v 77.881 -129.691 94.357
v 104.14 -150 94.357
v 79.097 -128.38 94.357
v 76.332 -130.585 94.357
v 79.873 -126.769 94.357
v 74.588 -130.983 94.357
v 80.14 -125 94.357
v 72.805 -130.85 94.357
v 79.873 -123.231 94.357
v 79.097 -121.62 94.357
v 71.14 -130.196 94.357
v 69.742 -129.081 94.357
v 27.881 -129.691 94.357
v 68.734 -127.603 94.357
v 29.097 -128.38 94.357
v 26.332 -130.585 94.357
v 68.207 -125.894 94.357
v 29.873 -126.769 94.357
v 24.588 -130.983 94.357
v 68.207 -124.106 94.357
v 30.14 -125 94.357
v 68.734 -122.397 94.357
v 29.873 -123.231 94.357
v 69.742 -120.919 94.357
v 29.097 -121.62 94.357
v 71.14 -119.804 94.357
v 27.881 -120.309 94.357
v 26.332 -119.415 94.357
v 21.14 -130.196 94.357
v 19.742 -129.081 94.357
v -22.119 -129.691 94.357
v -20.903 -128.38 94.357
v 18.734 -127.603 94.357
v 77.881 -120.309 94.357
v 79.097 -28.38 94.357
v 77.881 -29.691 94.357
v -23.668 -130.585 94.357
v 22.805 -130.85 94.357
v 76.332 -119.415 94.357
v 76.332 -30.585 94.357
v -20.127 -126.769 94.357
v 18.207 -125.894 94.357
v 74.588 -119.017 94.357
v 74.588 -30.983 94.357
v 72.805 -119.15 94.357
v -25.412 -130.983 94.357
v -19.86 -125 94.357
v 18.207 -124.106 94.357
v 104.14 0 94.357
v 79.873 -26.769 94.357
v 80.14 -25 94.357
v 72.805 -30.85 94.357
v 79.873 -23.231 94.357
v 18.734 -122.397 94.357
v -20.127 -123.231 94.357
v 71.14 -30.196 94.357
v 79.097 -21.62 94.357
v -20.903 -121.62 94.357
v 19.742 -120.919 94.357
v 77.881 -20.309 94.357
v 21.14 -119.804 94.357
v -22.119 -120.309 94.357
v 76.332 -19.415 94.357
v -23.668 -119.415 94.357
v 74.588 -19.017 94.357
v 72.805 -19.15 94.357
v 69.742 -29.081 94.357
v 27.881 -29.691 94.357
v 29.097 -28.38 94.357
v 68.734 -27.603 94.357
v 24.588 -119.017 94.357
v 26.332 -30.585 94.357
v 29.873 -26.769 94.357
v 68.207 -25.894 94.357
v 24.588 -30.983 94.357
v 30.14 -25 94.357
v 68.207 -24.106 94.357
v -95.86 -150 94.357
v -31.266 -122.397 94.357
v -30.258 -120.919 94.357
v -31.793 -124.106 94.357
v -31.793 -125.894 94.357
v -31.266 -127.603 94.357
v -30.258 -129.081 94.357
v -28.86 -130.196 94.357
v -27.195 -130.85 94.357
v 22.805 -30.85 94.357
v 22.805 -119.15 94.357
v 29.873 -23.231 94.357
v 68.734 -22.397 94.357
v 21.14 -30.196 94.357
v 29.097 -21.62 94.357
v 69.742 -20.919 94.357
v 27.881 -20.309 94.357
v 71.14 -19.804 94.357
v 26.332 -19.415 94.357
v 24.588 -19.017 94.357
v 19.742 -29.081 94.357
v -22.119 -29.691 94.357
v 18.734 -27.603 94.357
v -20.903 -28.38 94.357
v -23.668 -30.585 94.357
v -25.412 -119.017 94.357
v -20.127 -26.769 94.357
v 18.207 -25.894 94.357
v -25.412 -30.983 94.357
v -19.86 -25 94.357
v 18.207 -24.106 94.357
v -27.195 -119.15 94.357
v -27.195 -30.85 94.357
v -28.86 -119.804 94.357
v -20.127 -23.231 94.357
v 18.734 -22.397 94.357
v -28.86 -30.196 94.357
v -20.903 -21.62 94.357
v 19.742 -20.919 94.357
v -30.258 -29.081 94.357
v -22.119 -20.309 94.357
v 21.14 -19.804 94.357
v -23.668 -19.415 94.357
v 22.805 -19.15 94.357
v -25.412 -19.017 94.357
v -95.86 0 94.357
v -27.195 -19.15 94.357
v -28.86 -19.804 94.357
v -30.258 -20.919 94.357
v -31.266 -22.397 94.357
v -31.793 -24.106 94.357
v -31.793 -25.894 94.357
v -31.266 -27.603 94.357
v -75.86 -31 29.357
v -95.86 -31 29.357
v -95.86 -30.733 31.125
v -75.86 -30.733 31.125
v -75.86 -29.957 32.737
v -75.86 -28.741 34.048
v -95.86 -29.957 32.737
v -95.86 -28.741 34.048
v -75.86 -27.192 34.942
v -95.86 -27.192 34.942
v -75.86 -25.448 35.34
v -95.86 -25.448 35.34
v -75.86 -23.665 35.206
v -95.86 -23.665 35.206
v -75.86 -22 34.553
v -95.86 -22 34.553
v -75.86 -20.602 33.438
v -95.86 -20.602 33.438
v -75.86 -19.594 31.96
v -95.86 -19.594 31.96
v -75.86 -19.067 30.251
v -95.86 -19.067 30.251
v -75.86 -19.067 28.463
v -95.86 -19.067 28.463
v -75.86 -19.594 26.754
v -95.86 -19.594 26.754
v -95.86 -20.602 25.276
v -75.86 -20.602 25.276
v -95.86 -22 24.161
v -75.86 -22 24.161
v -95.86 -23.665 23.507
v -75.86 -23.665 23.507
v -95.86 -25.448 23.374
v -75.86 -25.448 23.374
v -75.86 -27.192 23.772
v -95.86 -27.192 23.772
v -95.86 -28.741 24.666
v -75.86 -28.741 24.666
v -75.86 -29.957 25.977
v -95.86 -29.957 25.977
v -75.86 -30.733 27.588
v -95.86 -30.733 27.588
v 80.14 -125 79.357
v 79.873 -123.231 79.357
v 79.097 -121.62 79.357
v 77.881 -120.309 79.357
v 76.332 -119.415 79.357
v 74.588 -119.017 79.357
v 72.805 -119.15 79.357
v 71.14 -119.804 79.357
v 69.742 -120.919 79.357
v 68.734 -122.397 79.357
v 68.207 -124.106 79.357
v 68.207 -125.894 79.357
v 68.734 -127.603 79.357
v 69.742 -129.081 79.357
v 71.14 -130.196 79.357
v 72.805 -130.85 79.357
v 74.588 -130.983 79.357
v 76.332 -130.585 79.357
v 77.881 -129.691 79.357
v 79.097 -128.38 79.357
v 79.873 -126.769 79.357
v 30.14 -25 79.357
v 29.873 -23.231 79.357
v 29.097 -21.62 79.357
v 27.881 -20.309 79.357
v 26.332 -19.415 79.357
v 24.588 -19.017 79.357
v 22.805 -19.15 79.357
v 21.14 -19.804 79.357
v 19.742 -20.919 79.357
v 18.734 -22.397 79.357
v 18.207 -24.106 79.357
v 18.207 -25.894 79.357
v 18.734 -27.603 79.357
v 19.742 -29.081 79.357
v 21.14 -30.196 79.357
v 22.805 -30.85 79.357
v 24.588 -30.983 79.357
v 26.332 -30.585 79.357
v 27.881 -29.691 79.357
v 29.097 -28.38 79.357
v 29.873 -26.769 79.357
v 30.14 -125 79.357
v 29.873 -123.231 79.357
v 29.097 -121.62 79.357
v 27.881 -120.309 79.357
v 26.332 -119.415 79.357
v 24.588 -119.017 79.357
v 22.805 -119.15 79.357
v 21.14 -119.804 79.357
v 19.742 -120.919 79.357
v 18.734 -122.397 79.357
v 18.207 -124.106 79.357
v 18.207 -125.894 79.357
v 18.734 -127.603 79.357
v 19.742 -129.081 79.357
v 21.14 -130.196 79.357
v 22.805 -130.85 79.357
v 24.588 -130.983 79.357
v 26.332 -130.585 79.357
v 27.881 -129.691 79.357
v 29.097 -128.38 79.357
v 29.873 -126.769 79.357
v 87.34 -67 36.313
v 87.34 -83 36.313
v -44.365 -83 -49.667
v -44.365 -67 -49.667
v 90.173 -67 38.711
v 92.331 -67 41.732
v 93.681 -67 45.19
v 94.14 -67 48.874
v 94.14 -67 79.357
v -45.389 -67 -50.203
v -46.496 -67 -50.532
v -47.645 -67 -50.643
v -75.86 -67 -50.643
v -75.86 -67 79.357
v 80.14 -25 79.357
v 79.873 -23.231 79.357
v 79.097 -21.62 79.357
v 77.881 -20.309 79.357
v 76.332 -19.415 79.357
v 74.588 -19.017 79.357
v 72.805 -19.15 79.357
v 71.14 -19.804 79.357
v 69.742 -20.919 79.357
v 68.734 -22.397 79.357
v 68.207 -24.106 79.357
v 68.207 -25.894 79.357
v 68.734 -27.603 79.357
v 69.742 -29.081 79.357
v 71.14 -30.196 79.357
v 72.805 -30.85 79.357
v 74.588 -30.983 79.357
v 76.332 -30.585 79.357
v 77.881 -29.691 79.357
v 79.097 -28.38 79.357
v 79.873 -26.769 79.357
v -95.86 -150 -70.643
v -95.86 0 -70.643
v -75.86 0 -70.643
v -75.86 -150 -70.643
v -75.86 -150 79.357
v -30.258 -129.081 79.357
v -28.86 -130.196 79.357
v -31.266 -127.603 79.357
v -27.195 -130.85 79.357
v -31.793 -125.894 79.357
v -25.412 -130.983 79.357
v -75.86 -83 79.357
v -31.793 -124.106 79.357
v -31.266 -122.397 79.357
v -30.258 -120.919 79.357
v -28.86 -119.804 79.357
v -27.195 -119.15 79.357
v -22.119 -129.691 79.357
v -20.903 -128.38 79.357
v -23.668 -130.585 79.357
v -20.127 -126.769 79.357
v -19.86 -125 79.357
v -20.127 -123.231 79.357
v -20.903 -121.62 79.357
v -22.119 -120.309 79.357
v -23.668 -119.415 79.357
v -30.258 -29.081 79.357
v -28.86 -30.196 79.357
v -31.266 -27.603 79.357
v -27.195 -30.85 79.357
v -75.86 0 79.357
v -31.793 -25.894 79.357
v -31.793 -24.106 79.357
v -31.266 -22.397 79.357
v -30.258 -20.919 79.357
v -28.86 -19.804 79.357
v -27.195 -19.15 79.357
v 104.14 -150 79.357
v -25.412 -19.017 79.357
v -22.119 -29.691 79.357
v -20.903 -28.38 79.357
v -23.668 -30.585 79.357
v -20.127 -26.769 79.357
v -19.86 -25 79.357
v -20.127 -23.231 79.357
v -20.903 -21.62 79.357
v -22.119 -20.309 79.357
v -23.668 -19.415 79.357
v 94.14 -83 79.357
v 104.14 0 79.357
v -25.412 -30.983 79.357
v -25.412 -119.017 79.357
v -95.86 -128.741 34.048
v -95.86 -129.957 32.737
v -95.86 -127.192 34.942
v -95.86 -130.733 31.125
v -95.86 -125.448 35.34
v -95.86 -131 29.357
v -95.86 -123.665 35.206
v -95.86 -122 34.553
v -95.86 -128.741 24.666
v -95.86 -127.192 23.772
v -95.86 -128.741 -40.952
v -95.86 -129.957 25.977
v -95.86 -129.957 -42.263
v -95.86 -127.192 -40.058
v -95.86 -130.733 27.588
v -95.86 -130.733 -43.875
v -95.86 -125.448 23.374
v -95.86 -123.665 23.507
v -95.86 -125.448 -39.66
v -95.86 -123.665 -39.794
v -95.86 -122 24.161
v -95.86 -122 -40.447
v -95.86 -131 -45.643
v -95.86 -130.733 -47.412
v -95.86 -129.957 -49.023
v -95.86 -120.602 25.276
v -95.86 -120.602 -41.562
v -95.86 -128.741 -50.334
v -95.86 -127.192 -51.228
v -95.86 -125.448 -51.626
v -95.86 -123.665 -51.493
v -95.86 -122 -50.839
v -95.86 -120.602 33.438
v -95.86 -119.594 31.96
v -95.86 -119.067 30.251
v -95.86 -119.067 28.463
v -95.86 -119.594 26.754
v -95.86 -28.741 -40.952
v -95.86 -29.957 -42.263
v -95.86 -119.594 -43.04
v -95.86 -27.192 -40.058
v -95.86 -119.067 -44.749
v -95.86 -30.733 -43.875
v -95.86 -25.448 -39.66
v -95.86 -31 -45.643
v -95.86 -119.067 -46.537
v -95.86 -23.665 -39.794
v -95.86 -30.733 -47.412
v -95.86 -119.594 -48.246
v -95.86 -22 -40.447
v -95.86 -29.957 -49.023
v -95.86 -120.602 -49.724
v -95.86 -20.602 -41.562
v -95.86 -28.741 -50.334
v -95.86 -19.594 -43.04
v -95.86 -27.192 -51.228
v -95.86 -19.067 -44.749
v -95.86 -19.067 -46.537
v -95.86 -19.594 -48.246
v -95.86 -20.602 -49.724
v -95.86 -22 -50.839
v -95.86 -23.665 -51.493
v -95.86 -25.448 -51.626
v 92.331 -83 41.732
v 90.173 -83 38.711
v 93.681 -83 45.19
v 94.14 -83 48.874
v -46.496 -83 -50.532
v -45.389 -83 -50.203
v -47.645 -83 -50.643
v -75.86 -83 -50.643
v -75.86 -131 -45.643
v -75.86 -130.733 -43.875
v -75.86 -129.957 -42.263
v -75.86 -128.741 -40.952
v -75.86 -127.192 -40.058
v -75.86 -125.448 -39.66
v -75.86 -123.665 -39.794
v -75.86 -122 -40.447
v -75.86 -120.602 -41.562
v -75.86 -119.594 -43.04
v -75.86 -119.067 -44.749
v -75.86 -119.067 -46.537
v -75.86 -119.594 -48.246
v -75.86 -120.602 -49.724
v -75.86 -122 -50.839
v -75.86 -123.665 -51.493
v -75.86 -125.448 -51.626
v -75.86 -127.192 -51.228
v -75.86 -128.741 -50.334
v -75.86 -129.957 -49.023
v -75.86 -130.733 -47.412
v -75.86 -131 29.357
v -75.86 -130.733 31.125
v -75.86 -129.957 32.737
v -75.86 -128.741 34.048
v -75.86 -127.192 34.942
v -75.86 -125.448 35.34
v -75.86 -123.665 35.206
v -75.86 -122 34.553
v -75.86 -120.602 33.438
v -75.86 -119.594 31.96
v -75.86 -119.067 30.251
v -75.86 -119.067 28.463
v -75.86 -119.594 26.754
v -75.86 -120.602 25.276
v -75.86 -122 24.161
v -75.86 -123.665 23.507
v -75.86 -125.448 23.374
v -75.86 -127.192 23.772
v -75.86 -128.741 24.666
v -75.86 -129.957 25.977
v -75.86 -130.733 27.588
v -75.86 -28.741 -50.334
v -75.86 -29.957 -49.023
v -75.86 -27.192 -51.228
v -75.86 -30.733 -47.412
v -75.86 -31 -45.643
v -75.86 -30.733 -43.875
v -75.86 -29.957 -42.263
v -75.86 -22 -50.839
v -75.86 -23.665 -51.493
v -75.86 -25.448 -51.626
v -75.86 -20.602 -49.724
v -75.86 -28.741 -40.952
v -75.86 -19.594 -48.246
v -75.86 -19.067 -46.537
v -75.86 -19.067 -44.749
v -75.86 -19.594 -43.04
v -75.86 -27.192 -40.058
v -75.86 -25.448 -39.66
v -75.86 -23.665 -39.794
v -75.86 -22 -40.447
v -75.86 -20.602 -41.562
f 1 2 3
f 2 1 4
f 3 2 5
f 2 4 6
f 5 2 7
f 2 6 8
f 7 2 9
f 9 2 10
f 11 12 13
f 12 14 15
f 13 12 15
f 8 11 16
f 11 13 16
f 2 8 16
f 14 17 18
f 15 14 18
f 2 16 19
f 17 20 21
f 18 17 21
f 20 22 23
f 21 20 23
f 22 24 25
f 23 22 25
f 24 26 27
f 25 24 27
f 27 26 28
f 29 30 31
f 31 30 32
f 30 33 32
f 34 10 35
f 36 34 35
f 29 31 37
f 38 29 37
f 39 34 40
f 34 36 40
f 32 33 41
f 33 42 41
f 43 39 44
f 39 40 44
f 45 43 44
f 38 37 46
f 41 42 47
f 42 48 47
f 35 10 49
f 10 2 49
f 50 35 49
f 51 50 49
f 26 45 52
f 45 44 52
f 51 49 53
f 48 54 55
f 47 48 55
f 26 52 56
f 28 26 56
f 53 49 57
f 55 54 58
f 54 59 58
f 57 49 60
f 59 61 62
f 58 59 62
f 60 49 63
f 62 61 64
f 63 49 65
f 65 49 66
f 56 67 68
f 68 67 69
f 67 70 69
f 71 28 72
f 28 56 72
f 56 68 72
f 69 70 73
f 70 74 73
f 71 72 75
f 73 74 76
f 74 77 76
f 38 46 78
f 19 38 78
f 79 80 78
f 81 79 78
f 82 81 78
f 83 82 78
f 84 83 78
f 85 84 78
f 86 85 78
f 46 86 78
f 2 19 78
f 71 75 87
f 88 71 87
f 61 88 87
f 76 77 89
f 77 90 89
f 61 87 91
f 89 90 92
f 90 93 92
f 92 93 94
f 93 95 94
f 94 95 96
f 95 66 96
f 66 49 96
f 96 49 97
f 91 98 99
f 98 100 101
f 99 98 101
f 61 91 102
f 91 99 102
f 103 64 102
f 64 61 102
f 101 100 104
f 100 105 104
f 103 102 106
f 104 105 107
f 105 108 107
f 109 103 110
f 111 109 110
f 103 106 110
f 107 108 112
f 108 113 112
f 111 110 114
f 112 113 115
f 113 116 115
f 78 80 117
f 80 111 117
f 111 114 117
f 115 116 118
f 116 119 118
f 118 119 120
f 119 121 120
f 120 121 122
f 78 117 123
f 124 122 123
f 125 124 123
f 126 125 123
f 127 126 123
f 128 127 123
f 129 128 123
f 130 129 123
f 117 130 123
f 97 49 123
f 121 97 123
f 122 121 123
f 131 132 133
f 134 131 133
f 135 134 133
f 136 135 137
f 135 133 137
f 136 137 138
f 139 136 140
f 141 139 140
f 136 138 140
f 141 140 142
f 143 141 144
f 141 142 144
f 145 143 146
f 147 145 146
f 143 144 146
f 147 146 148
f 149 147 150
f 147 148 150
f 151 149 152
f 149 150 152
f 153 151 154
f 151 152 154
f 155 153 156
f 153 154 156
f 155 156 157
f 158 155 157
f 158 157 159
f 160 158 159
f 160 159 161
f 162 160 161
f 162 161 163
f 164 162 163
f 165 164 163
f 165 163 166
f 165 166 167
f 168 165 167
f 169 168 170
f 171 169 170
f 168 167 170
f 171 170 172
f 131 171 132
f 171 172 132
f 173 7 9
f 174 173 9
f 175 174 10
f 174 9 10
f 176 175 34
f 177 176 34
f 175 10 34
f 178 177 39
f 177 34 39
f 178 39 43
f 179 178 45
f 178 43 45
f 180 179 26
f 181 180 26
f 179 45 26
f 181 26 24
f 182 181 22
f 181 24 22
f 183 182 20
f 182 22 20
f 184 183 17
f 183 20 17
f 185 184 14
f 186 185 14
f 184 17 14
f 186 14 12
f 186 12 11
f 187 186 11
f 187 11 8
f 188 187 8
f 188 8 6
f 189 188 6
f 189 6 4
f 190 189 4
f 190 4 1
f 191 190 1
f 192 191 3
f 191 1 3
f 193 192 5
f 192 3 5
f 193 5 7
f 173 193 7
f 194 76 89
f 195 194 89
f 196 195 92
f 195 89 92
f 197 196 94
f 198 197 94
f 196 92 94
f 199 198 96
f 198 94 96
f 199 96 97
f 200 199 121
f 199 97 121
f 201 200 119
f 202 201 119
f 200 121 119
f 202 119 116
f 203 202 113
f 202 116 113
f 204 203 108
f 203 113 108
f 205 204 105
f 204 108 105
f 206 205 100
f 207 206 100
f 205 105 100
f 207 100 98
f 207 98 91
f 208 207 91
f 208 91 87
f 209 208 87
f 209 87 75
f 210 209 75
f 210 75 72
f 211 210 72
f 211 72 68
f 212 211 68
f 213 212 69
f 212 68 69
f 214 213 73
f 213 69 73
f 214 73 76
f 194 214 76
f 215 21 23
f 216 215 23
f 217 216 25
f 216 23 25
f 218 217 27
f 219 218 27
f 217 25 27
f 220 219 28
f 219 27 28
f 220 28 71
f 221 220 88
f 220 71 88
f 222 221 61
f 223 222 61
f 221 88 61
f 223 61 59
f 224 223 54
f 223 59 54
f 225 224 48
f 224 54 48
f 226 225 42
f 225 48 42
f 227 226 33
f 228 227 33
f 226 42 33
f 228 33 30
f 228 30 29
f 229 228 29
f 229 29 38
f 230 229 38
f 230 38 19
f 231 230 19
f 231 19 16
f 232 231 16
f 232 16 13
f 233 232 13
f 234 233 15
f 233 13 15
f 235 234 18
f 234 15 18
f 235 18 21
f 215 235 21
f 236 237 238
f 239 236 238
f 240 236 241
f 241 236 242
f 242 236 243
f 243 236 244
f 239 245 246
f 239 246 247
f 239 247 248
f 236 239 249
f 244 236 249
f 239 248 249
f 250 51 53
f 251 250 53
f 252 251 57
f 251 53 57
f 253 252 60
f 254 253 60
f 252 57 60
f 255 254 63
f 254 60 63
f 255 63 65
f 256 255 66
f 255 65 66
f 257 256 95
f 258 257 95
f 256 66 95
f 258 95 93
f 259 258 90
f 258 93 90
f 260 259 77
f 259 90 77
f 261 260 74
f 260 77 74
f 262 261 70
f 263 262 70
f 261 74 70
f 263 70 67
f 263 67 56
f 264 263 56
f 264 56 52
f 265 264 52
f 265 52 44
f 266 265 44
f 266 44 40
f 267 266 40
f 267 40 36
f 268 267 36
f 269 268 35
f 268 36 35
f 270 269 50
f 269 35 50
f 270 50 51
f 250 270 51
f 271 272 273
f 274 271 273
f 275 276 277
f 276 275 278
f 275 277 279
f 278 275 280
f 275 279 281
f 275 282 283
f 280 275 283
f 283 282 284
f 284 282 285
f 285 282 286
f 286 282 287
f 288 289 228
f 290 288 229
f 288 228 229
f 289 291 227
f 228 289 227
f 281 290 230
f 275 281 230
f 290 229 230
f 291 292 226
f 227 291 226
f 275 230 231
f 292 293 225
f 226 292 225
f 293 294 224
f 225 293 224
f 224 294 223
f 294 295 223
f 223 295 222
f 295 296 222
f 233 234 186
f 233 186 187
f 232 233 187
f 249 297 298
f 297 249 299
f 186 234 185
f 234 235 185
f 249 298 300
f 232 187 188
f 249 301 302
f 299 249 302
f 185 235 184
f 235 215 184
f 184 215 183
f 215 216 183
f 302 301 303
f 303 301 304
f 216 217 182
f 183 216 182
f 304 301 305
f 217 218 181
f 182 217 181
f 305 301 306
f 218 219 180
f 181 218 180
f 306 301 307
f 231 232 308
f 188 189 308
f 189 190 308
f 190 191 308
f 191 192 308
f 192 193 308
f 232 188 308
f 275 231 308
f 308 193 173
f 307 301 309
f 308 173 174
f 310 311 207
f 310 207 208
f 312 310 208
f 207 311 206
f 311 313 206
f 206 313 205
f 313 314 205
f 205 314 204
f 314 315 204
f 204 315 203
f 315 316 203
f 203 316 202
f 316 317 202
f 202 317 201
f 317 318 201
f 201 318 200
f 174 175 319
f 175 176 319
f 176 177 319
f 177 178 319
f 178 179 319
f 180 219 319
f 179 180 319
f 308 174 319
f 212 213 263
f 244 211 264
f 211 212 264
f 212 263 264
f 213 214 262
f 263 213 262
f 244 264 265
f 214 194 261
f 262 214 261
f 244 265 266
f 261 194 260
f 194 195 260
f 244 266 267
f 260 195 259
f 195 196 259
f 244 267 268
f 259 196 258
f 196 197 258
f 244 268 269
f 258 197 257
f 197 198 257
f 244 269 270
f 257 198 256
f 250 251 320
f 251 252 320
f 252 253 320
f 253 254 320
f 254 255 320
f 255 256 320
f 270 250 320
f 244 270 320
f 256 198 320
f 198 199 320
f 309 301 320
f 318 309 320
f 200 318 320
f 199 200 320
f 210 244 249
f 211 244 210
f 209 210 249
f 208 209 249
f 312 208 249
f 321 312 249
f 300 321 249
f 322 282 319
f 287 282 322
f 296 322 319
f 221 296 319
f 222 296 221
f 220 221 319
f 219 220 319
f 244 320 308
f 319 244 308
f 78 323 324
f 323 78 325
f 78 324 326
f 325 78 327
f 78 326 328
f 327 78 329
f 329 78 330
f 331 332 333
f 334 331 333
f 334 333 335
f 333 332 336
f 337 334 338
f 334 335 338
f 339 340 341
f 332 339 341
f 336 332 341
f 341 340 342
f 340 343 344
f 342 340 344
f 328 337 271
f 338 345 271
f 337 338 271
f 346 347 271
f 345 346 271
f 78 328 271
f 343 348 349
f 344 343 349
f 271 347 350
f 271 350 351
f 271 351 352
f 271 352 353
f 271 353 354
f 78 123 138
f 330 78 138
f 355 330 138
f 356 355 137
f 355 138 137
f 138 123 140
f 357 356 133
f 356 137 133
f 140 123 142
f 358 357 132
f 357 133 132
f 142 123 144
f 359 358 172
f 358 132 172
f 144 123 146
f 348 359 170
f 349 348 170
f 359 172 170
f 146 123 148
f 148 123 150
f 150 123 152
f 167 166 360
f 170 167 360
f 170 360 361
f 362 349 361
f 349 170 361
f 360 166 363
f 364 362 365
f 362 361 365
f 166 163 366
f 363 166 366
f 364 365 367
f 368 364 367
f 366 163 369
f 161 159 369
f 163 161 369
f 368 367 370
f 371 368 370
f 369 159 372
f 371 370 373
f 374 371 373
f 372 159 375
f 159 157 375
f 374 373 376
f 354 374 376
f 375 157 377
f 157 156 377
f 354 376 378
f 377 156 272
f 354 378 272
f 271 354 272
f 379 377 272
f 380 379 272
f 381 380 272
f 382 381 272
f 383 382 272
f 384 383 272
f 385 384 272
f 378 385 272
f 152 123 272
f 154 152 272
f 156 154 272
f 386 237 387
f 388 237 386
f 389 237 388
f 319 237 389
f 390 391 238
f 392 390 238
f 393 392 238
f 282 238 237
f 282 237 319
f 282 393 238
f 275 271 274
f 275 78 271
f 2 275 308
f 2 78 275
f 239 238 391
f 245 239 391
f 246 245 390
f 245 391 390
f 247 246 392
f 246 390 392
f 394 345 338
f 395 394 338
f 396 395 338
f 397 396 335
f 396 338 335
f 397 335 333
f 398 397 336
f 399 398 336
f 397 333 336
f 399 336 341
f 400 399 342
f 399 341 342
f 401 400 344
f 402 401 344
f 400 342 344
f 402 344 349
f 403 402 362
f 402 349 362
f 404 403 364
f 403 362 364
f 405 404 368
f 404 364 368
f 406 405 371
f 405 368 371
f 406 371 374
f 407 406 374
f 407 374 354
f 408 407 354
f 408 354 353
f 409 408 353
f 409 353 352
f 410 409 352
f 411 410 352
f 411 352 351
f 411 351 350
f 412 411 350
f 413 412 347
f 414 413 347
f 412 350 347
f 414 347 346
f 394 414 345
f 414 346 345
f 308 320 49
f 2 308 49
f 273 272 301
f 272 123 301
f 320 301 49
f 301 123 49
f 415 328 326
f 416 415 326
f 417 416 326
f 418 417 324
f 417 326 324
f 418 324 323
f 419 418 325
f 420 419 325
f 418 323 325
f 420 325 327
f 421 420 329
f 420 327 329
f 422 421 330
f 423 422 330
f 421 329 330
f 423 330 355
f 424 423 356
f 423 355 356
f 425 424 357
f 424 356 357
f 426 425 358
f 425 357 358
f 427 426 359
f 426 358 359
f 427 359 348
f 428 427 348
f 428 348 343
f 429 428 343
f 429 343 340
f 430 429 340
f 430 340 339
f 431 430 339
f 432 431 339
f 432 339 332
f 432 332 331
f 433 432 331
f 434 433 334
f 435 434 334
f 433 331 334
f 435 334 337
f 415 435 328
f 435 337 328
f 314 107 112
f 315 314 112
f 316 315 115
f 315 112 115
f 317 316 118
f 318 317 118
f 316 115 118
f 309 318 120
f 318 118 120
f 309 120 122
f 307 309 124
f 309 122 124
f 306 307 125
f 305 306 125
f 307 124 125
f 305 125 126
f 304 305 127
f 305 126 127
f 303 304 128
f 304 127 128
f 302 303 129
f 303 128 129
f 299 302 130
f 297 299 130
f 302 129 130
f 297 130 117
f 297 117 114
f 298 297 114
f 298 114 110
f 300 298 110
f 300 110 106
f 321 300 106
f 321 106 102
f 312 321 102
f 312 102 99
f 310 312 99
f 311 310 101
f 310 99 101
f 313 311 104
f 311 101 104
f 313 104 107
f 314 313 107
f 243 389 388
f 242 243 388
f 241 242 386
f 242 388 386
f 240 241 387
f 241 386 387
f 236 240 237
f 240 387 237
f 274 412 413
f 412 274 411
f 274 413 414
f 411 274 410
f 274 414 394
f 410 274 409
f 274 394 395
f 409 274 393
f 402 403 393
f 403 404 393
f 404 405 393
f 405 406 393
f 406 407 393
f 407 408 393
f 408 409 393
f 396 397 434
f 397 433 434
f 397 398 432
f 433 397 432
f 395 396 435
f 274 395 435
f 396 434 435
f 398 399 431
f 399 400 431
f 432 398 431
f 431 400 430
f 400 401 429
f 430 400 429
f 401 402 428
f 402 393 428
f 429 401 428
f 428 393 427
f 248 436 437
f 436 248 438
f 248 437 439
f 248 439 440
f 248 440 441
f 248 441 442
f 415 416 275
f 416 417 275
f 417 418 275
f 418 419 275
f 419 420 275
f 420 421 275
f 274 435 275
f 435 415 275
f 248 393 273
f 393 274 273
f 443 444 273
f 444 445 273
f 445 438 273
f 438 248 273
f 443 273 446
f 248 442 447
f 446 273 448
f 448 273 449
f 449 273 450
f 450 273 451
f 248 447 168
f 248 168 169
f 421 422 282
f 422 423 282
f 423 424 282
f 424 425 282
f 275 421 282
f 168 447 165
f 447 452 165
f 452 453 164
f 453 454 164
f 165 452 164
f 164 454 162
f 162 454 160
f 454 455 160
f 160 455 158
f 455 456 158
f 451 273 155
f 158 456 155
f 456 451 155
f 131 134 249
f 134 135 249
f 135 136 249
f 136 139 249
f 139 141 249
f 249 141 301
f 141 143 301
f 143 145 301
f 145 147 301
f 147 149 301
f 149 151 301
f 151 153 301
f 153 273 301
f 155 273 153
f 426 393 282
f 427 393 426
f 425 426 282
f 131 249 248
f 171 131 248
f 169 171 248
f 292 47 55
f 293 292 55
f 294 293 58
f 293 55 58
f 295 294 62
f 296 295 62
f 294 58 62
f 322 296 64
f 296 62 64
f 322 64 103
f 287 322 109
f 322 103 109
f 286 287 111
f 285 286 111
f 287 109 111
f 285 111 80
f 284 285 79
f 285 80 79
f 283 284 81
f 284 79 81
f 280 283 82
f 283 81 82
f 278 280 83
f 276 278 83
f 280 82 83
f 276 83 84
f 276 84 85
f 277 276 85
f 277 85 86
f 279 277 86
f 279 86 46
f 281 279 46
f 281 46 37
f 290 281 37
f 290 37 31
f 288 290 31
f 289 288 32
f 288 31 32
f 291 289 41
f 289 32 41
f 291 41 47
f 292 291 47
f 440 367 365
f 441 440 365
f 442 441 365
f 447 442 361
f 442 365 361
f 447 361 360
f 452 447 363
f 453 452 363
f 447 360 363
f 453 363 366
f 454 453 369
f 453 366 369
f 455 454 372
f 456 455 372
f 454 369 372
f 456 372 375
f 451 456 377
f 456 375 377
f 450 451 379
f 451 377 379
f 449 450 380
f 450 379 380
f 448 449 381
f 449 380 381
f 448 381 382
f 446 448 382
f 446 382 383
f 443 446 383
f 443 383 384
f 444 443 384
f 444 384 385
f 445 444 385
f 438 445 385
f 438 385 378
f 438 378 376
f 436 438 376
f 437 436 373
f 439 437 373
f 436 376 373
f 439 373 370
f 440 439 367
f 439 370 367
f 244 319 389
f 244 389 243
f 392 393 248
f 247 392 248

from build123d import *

# Parameters (mm, degrees)
F1_DEPTH = 150
F2_W     = 16
F2_H     = 130
F3_DEPTH = 170
F5_DEPTH = 16
F6_R     = 6
F7_DEPTH = 15
F8_R     = 6
F9_DEPTH = 20


with BuildPart() as f1:
    # F0 (on Front) → F1 (new body)
    with BuildSketch(Plane.XZ):
        Polygon((-95.860116, -70.643179), (-75.860116, -70.643179), (-75.860116, 79.356821), (104.139884, 79.356821), (104.139884, 94.356821), (-95.860116, 94.356821), align=None)
    extrude(amount=F1_DEPTH)

    # F2 (on face) → F3 (join)
    with BuildSketch(Plane.YZ.offset(-75.860116)):
        with Locations((-75, 14.356821)):
            Rectangle(F2_W, F2_H)
    extrude(amount=F3_DEPTH)

    # F4 (on face) → F5 (cut)
    with BuildSketch(Plane.XZ.offset(83)):
        with BuildLine():
            ThreePointArc((-44.365328, -49.667342), (-45.934238, -50.394048), (-47.645235, -50.643179))
            Line((-47.645235, -50.643179), (94.139884, -50.643179))
            Line((94.139884, -50.643179), (94.139884, 48.873568))
            ThreePointArc((94.139884, 48.873568), (92.330723, 41.732018), (87.339651, 36.313161))
            Line((87.339651, 36.313161), (-44.365328, -49.667342))
        make_face()
    extrude(amount=-F5_DEPTH, mode=Mode.SUBTRACT)

    # F6 (on face) → F7 (cut)
    with BuildSketch(Plane.XY.offset(94.356821)):
        with Locations((-25.860116, -25)):
            Circle(F6_R)
        with Locations((24.139884, -25)):
            Circle(F6_R)
        with Locations((74.139884, -25)):
            Circle(F6_R)
        with Locations((74.139884, -125)):
            Circle(F6_R)
        with Locations((24.139884, -125)):
            Circle(F6_R)
        with Locations((-25.860116, -125)):
            Circle(F6_R)
    extrude(amount=-F7_DEPTH, mode=Mode.SUBTRACT)

    # F8 (on face) → F9 (cut)
    with BuildSketch(Plane(origin=(-95.860116, 0, 0), x_dir=(0, -1, 0), z_dir=(-1, 0, 0))):
        with Locations((125, 29.356821)):
            Circle(F8_R)
        with Locations((125, -45.643179)):
            Circle(F8_R)
        with Locations((25, -45.643179)):
            Circle(F8_R)
        with Locations((25, 29.356821)):
            Circle(F8_R)
    extrude(amount=-F9_DEPTH, mode=Mode.SUBTRACT)


solid = f1.part
